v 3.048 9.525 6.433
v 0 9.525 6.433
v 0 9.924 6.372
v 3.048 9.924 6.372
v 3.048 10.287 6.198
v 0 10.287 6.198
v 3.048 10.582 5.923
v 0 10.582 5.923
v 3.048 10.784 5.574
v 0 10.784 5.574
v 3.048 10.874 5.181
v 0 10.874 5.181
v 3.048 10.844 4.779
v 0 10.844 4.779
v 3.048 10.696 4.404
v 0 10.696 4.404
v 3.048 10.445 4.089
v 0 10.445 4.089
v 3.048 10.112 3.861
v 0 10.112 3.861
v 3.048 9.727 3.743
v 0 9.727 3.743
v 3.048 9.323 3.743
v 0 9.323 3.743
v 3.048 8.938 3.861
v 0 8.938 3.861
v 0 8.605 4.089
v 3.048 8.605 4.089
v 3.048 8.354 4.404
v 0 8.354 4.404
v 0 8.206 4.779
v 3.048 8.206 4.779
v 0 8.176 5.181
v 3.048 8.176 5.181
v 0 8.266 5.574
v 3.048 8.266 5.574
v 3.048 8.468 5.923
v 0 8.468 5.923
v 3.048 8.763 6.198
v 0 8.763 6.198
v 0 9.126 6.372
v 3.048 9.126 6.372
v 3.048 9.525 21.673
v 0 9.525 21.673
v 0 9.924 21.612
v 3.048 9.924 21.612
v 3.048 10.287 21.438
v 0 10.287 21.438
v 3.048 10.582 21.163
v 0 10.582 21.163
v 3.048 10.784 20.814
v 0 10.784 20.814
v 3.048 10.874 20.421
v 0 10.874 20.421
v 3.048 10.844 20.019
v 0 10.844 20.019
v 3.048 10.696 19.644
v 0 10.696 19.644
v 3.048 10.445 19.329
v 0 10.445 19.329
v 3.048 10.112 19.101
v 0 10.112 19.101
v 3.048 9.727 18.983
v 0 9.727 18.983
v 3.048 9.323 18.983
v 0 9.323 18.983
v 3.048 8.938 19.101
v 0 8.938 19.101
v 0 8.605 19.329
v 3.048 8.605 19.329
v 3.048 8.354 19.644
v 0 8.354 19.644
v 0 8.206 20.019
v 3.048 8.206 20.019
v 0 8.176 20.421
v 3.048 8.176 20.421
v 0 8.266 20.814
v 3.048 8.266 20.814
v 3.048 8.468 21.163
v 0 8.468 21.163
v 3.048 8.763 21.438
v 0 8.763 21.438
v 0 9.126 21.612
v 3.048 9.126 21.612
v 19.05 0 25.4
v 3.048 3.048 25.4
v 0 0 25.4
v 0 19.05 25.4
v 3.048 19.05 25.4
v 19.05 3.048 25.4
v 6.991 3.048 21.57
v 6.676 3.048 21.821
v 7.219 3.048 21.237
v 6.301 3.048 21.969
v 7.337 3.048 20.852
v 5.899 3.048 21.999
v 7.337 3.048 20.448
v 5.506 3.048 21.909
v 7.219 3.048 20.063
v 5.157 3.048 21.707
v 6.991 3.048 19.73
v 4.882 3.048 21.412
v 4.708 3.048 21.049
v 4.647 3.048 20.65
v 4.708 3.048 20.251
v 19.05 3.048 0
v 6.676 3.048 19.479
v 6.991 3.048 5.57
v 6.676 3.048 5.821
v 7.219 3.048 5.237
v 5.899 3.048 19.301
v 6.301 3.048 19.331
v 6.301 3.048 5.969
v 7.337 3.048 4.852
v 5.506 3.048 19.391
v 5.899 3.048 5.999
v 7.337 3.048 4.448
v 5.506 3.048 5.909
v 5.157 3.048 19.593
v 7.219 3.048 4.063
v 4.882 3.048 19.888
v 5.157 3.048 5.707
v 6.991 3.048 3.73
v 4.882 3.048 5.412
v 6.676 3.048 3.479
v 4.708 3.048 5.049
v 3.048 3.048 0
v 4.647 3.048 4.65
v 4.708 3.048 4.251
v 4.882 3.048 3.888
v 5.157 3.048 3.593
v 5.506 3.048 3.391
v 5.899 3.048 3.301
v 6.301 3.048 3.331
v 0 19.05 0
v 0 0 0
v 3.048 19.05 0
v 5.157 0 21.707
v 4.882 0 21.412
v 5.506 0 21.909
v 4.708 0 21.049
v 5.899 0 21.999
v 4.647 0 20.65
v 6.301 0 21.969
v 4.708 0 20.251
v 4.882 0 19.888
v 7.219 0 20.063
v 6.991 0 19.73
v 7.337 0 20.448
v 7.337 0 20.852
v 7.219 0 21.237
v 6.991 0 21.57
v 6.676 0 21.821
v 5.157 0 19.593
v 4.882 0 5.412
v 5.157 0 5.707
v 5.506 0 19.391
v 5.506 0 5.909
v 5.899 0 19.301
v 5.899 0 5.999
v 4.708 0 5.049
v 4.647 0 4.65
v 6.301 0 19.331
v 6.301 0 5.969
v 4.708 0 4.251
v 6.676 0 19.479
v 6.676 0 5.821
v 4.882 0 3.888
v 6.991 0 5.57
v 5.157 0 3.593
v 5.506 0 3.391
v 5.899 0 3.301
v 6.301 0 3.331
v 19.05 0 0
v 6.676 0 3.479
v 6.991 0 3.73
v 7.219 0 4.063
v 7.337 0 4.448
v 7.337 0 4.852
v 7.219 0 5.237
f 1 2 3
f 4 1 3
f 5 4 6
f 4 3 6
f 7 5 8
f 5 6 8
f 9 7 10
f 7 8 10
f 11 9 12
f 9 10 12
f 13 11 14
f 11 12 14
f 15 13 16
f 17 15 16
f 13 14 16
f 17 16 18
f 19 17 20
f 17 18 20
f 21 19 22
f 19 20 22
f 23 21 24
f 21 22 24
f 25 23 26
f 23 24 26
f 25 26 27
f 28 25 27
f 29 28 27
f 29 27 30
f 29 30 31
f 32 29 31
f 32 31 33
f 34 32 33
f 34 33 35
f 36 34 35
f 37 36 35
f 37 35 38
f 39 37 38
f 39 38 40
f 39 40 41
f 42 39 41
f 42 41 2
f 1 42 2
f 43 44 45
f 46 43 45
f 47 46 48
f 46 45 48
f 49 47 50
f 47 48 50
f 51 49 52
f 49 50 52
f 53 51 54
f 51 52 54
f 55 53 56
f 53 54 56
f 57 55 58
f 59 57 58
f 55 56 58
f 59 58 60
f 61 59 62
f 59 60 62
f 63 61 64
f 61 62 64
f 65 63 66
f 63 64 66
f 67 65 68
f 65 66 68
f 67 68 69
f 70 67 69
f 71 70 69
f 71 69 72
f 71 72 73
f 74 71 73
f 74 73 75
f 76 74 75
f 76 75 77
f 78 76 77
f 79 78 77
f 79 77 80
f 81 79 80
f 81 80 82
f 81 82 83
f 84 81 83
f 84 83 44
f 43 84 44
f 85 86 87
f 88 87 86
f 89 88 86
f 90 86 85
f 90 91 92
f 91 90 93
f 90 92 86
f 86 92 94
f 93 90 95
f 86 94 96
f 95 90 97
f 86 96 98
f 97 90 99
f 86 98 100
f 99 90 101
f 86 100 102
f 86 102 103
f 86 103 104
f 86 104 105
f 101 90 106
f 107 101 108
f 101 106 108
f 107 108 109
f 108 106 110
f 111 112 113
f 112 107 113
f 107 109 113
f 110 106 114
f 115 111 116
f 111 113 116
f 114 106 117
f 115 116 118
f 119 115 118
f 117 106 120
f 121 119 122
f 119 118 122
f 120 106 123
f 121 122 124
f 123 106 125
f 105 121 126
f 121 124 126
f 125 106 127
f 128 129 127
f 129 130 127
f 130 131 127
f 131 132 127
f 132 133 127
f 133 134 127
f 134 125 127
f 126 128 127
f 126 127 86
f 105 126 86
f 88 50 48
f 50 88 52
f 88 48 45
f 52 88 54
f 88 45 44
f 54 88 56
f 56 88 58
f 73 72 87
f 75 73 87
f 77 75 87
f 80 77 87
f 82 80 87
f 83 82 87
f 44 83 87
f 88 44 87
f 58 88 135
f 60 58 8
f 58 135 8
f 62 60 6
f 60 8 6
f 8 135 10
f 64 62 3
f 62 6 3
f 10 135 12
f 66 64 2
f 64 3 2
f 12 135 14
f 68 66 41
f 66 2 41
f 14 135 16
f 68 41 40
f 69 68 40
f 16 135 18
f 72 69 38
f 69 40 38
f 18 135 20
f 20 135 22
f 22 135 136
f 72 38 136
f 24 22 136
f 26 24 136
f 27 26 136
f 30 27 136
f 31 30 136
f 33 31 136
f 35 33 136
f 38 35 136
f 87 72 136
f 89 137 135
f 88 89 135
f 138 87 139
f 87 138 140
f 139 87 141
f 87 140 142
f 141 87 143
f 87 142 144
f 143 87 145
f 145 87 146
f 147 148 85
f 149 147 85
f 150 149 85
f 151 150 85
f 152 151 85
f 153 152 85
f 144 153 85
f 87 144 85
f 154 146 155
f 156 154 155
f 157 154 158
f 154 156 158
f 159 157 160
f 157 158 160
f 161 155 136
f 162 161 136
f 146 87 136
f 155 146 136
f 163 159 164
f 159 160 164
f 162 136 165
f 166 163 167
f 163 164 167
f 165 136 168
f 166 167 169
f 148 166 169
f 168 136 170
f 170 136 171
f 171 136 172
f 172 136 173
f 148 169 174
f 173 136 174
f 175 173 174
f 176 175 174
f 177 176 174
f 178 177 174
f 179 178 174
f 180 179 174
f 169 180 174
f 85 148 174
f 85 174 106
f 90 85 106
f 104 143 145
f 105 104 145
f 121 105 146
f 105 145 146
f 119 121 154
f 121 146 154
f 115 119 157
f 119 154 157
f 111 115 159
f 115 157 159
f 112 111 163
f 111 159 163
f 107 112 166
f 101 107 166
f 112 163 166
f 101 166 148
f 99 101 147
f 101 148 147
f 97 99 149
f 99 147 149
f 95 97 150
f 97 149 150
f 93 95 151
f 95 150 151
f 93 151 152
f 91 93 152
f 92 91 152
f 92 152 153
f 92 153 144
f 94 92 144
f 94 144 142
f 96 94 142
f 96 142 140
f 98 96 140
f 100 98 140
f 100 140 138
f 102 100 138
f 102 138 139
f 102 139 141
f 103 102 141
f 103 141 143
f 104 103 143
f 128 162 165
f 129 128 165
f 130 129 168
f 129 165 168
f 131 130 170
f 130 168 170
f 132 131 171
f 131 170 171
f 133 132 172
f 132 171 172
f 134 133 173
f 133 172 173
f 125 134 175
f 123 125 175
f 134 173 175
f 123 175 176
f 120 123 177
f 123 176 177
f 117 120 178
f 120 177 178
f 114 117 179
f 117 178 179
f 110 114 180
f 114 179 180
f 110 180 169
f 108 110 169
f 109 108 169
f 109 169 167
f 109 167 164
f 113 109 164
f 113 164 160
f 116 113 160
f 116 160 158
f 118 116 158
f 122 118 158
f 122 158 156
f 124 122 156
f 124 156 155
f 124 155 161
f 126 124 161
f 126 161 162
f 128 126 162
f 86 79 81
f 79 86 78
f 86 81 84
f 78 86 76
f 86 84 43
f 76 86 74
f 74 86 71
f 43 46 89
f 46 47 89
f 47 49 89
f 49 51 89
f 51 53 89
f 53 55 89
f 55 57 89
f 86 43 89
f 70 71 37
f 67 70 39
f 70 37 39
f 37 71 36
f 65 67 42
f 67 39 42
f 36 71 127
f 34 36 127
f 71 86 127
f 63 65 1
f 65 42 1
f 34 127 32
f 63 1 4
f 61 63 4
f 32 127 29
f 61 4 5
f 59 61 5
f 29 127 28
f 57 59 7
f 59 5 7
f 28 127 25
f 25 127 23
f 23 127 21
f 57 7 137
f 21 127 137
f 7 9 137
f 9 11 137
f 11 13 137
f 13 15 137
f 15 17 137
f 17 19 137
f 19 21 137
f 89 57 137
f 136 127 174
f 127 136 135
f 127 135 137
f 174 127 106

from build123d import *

# Parameters (mm, degrees)
BOSS_EXTRUDE1_DEPTH   = 25.4
F_6_32_TAPPED_HOLE1_D = 2.7051
F_6_32_TAPPED_HOLE2_D = 2.7051


with BuildPart() as part:
    # Sketch1 → Boss-Extrude1 (new body)
    with BuildSketch(Plane.XY):
        Polygon((0, 0), (19.05, 0), (19.05, 3.048), (3.048, 3.048), (3.048, 19.05), (0, 19.05), align=None)
    extrude(amount=BOSS_EXTRUDE1_DEPTH)

    # #6-32 Tapped Hole1 (through all)
    with Locations(Plane(origin=(3.048, 0, 0), x_dir=(0, 0, -1), z_dir=(1, 0, 0))):
        with Locations((-20.32, 9.525), (-5.08, 9.525)):
            Hole(F_6_32_TAPPED_HOLE1_D / 2)

    # #6-32 Tapped Hole2 (through all)
    with Locations(Plane(origin=(0, 3.048, 0), x_dir=(1, 0, 0), z_dir=(0, 1, 0))):
        with Locations((6, -20.65), (6, -4.65)):
            Hole(F_6_32_TAPPED_HOLE2_D / 2)


solid = part.part
